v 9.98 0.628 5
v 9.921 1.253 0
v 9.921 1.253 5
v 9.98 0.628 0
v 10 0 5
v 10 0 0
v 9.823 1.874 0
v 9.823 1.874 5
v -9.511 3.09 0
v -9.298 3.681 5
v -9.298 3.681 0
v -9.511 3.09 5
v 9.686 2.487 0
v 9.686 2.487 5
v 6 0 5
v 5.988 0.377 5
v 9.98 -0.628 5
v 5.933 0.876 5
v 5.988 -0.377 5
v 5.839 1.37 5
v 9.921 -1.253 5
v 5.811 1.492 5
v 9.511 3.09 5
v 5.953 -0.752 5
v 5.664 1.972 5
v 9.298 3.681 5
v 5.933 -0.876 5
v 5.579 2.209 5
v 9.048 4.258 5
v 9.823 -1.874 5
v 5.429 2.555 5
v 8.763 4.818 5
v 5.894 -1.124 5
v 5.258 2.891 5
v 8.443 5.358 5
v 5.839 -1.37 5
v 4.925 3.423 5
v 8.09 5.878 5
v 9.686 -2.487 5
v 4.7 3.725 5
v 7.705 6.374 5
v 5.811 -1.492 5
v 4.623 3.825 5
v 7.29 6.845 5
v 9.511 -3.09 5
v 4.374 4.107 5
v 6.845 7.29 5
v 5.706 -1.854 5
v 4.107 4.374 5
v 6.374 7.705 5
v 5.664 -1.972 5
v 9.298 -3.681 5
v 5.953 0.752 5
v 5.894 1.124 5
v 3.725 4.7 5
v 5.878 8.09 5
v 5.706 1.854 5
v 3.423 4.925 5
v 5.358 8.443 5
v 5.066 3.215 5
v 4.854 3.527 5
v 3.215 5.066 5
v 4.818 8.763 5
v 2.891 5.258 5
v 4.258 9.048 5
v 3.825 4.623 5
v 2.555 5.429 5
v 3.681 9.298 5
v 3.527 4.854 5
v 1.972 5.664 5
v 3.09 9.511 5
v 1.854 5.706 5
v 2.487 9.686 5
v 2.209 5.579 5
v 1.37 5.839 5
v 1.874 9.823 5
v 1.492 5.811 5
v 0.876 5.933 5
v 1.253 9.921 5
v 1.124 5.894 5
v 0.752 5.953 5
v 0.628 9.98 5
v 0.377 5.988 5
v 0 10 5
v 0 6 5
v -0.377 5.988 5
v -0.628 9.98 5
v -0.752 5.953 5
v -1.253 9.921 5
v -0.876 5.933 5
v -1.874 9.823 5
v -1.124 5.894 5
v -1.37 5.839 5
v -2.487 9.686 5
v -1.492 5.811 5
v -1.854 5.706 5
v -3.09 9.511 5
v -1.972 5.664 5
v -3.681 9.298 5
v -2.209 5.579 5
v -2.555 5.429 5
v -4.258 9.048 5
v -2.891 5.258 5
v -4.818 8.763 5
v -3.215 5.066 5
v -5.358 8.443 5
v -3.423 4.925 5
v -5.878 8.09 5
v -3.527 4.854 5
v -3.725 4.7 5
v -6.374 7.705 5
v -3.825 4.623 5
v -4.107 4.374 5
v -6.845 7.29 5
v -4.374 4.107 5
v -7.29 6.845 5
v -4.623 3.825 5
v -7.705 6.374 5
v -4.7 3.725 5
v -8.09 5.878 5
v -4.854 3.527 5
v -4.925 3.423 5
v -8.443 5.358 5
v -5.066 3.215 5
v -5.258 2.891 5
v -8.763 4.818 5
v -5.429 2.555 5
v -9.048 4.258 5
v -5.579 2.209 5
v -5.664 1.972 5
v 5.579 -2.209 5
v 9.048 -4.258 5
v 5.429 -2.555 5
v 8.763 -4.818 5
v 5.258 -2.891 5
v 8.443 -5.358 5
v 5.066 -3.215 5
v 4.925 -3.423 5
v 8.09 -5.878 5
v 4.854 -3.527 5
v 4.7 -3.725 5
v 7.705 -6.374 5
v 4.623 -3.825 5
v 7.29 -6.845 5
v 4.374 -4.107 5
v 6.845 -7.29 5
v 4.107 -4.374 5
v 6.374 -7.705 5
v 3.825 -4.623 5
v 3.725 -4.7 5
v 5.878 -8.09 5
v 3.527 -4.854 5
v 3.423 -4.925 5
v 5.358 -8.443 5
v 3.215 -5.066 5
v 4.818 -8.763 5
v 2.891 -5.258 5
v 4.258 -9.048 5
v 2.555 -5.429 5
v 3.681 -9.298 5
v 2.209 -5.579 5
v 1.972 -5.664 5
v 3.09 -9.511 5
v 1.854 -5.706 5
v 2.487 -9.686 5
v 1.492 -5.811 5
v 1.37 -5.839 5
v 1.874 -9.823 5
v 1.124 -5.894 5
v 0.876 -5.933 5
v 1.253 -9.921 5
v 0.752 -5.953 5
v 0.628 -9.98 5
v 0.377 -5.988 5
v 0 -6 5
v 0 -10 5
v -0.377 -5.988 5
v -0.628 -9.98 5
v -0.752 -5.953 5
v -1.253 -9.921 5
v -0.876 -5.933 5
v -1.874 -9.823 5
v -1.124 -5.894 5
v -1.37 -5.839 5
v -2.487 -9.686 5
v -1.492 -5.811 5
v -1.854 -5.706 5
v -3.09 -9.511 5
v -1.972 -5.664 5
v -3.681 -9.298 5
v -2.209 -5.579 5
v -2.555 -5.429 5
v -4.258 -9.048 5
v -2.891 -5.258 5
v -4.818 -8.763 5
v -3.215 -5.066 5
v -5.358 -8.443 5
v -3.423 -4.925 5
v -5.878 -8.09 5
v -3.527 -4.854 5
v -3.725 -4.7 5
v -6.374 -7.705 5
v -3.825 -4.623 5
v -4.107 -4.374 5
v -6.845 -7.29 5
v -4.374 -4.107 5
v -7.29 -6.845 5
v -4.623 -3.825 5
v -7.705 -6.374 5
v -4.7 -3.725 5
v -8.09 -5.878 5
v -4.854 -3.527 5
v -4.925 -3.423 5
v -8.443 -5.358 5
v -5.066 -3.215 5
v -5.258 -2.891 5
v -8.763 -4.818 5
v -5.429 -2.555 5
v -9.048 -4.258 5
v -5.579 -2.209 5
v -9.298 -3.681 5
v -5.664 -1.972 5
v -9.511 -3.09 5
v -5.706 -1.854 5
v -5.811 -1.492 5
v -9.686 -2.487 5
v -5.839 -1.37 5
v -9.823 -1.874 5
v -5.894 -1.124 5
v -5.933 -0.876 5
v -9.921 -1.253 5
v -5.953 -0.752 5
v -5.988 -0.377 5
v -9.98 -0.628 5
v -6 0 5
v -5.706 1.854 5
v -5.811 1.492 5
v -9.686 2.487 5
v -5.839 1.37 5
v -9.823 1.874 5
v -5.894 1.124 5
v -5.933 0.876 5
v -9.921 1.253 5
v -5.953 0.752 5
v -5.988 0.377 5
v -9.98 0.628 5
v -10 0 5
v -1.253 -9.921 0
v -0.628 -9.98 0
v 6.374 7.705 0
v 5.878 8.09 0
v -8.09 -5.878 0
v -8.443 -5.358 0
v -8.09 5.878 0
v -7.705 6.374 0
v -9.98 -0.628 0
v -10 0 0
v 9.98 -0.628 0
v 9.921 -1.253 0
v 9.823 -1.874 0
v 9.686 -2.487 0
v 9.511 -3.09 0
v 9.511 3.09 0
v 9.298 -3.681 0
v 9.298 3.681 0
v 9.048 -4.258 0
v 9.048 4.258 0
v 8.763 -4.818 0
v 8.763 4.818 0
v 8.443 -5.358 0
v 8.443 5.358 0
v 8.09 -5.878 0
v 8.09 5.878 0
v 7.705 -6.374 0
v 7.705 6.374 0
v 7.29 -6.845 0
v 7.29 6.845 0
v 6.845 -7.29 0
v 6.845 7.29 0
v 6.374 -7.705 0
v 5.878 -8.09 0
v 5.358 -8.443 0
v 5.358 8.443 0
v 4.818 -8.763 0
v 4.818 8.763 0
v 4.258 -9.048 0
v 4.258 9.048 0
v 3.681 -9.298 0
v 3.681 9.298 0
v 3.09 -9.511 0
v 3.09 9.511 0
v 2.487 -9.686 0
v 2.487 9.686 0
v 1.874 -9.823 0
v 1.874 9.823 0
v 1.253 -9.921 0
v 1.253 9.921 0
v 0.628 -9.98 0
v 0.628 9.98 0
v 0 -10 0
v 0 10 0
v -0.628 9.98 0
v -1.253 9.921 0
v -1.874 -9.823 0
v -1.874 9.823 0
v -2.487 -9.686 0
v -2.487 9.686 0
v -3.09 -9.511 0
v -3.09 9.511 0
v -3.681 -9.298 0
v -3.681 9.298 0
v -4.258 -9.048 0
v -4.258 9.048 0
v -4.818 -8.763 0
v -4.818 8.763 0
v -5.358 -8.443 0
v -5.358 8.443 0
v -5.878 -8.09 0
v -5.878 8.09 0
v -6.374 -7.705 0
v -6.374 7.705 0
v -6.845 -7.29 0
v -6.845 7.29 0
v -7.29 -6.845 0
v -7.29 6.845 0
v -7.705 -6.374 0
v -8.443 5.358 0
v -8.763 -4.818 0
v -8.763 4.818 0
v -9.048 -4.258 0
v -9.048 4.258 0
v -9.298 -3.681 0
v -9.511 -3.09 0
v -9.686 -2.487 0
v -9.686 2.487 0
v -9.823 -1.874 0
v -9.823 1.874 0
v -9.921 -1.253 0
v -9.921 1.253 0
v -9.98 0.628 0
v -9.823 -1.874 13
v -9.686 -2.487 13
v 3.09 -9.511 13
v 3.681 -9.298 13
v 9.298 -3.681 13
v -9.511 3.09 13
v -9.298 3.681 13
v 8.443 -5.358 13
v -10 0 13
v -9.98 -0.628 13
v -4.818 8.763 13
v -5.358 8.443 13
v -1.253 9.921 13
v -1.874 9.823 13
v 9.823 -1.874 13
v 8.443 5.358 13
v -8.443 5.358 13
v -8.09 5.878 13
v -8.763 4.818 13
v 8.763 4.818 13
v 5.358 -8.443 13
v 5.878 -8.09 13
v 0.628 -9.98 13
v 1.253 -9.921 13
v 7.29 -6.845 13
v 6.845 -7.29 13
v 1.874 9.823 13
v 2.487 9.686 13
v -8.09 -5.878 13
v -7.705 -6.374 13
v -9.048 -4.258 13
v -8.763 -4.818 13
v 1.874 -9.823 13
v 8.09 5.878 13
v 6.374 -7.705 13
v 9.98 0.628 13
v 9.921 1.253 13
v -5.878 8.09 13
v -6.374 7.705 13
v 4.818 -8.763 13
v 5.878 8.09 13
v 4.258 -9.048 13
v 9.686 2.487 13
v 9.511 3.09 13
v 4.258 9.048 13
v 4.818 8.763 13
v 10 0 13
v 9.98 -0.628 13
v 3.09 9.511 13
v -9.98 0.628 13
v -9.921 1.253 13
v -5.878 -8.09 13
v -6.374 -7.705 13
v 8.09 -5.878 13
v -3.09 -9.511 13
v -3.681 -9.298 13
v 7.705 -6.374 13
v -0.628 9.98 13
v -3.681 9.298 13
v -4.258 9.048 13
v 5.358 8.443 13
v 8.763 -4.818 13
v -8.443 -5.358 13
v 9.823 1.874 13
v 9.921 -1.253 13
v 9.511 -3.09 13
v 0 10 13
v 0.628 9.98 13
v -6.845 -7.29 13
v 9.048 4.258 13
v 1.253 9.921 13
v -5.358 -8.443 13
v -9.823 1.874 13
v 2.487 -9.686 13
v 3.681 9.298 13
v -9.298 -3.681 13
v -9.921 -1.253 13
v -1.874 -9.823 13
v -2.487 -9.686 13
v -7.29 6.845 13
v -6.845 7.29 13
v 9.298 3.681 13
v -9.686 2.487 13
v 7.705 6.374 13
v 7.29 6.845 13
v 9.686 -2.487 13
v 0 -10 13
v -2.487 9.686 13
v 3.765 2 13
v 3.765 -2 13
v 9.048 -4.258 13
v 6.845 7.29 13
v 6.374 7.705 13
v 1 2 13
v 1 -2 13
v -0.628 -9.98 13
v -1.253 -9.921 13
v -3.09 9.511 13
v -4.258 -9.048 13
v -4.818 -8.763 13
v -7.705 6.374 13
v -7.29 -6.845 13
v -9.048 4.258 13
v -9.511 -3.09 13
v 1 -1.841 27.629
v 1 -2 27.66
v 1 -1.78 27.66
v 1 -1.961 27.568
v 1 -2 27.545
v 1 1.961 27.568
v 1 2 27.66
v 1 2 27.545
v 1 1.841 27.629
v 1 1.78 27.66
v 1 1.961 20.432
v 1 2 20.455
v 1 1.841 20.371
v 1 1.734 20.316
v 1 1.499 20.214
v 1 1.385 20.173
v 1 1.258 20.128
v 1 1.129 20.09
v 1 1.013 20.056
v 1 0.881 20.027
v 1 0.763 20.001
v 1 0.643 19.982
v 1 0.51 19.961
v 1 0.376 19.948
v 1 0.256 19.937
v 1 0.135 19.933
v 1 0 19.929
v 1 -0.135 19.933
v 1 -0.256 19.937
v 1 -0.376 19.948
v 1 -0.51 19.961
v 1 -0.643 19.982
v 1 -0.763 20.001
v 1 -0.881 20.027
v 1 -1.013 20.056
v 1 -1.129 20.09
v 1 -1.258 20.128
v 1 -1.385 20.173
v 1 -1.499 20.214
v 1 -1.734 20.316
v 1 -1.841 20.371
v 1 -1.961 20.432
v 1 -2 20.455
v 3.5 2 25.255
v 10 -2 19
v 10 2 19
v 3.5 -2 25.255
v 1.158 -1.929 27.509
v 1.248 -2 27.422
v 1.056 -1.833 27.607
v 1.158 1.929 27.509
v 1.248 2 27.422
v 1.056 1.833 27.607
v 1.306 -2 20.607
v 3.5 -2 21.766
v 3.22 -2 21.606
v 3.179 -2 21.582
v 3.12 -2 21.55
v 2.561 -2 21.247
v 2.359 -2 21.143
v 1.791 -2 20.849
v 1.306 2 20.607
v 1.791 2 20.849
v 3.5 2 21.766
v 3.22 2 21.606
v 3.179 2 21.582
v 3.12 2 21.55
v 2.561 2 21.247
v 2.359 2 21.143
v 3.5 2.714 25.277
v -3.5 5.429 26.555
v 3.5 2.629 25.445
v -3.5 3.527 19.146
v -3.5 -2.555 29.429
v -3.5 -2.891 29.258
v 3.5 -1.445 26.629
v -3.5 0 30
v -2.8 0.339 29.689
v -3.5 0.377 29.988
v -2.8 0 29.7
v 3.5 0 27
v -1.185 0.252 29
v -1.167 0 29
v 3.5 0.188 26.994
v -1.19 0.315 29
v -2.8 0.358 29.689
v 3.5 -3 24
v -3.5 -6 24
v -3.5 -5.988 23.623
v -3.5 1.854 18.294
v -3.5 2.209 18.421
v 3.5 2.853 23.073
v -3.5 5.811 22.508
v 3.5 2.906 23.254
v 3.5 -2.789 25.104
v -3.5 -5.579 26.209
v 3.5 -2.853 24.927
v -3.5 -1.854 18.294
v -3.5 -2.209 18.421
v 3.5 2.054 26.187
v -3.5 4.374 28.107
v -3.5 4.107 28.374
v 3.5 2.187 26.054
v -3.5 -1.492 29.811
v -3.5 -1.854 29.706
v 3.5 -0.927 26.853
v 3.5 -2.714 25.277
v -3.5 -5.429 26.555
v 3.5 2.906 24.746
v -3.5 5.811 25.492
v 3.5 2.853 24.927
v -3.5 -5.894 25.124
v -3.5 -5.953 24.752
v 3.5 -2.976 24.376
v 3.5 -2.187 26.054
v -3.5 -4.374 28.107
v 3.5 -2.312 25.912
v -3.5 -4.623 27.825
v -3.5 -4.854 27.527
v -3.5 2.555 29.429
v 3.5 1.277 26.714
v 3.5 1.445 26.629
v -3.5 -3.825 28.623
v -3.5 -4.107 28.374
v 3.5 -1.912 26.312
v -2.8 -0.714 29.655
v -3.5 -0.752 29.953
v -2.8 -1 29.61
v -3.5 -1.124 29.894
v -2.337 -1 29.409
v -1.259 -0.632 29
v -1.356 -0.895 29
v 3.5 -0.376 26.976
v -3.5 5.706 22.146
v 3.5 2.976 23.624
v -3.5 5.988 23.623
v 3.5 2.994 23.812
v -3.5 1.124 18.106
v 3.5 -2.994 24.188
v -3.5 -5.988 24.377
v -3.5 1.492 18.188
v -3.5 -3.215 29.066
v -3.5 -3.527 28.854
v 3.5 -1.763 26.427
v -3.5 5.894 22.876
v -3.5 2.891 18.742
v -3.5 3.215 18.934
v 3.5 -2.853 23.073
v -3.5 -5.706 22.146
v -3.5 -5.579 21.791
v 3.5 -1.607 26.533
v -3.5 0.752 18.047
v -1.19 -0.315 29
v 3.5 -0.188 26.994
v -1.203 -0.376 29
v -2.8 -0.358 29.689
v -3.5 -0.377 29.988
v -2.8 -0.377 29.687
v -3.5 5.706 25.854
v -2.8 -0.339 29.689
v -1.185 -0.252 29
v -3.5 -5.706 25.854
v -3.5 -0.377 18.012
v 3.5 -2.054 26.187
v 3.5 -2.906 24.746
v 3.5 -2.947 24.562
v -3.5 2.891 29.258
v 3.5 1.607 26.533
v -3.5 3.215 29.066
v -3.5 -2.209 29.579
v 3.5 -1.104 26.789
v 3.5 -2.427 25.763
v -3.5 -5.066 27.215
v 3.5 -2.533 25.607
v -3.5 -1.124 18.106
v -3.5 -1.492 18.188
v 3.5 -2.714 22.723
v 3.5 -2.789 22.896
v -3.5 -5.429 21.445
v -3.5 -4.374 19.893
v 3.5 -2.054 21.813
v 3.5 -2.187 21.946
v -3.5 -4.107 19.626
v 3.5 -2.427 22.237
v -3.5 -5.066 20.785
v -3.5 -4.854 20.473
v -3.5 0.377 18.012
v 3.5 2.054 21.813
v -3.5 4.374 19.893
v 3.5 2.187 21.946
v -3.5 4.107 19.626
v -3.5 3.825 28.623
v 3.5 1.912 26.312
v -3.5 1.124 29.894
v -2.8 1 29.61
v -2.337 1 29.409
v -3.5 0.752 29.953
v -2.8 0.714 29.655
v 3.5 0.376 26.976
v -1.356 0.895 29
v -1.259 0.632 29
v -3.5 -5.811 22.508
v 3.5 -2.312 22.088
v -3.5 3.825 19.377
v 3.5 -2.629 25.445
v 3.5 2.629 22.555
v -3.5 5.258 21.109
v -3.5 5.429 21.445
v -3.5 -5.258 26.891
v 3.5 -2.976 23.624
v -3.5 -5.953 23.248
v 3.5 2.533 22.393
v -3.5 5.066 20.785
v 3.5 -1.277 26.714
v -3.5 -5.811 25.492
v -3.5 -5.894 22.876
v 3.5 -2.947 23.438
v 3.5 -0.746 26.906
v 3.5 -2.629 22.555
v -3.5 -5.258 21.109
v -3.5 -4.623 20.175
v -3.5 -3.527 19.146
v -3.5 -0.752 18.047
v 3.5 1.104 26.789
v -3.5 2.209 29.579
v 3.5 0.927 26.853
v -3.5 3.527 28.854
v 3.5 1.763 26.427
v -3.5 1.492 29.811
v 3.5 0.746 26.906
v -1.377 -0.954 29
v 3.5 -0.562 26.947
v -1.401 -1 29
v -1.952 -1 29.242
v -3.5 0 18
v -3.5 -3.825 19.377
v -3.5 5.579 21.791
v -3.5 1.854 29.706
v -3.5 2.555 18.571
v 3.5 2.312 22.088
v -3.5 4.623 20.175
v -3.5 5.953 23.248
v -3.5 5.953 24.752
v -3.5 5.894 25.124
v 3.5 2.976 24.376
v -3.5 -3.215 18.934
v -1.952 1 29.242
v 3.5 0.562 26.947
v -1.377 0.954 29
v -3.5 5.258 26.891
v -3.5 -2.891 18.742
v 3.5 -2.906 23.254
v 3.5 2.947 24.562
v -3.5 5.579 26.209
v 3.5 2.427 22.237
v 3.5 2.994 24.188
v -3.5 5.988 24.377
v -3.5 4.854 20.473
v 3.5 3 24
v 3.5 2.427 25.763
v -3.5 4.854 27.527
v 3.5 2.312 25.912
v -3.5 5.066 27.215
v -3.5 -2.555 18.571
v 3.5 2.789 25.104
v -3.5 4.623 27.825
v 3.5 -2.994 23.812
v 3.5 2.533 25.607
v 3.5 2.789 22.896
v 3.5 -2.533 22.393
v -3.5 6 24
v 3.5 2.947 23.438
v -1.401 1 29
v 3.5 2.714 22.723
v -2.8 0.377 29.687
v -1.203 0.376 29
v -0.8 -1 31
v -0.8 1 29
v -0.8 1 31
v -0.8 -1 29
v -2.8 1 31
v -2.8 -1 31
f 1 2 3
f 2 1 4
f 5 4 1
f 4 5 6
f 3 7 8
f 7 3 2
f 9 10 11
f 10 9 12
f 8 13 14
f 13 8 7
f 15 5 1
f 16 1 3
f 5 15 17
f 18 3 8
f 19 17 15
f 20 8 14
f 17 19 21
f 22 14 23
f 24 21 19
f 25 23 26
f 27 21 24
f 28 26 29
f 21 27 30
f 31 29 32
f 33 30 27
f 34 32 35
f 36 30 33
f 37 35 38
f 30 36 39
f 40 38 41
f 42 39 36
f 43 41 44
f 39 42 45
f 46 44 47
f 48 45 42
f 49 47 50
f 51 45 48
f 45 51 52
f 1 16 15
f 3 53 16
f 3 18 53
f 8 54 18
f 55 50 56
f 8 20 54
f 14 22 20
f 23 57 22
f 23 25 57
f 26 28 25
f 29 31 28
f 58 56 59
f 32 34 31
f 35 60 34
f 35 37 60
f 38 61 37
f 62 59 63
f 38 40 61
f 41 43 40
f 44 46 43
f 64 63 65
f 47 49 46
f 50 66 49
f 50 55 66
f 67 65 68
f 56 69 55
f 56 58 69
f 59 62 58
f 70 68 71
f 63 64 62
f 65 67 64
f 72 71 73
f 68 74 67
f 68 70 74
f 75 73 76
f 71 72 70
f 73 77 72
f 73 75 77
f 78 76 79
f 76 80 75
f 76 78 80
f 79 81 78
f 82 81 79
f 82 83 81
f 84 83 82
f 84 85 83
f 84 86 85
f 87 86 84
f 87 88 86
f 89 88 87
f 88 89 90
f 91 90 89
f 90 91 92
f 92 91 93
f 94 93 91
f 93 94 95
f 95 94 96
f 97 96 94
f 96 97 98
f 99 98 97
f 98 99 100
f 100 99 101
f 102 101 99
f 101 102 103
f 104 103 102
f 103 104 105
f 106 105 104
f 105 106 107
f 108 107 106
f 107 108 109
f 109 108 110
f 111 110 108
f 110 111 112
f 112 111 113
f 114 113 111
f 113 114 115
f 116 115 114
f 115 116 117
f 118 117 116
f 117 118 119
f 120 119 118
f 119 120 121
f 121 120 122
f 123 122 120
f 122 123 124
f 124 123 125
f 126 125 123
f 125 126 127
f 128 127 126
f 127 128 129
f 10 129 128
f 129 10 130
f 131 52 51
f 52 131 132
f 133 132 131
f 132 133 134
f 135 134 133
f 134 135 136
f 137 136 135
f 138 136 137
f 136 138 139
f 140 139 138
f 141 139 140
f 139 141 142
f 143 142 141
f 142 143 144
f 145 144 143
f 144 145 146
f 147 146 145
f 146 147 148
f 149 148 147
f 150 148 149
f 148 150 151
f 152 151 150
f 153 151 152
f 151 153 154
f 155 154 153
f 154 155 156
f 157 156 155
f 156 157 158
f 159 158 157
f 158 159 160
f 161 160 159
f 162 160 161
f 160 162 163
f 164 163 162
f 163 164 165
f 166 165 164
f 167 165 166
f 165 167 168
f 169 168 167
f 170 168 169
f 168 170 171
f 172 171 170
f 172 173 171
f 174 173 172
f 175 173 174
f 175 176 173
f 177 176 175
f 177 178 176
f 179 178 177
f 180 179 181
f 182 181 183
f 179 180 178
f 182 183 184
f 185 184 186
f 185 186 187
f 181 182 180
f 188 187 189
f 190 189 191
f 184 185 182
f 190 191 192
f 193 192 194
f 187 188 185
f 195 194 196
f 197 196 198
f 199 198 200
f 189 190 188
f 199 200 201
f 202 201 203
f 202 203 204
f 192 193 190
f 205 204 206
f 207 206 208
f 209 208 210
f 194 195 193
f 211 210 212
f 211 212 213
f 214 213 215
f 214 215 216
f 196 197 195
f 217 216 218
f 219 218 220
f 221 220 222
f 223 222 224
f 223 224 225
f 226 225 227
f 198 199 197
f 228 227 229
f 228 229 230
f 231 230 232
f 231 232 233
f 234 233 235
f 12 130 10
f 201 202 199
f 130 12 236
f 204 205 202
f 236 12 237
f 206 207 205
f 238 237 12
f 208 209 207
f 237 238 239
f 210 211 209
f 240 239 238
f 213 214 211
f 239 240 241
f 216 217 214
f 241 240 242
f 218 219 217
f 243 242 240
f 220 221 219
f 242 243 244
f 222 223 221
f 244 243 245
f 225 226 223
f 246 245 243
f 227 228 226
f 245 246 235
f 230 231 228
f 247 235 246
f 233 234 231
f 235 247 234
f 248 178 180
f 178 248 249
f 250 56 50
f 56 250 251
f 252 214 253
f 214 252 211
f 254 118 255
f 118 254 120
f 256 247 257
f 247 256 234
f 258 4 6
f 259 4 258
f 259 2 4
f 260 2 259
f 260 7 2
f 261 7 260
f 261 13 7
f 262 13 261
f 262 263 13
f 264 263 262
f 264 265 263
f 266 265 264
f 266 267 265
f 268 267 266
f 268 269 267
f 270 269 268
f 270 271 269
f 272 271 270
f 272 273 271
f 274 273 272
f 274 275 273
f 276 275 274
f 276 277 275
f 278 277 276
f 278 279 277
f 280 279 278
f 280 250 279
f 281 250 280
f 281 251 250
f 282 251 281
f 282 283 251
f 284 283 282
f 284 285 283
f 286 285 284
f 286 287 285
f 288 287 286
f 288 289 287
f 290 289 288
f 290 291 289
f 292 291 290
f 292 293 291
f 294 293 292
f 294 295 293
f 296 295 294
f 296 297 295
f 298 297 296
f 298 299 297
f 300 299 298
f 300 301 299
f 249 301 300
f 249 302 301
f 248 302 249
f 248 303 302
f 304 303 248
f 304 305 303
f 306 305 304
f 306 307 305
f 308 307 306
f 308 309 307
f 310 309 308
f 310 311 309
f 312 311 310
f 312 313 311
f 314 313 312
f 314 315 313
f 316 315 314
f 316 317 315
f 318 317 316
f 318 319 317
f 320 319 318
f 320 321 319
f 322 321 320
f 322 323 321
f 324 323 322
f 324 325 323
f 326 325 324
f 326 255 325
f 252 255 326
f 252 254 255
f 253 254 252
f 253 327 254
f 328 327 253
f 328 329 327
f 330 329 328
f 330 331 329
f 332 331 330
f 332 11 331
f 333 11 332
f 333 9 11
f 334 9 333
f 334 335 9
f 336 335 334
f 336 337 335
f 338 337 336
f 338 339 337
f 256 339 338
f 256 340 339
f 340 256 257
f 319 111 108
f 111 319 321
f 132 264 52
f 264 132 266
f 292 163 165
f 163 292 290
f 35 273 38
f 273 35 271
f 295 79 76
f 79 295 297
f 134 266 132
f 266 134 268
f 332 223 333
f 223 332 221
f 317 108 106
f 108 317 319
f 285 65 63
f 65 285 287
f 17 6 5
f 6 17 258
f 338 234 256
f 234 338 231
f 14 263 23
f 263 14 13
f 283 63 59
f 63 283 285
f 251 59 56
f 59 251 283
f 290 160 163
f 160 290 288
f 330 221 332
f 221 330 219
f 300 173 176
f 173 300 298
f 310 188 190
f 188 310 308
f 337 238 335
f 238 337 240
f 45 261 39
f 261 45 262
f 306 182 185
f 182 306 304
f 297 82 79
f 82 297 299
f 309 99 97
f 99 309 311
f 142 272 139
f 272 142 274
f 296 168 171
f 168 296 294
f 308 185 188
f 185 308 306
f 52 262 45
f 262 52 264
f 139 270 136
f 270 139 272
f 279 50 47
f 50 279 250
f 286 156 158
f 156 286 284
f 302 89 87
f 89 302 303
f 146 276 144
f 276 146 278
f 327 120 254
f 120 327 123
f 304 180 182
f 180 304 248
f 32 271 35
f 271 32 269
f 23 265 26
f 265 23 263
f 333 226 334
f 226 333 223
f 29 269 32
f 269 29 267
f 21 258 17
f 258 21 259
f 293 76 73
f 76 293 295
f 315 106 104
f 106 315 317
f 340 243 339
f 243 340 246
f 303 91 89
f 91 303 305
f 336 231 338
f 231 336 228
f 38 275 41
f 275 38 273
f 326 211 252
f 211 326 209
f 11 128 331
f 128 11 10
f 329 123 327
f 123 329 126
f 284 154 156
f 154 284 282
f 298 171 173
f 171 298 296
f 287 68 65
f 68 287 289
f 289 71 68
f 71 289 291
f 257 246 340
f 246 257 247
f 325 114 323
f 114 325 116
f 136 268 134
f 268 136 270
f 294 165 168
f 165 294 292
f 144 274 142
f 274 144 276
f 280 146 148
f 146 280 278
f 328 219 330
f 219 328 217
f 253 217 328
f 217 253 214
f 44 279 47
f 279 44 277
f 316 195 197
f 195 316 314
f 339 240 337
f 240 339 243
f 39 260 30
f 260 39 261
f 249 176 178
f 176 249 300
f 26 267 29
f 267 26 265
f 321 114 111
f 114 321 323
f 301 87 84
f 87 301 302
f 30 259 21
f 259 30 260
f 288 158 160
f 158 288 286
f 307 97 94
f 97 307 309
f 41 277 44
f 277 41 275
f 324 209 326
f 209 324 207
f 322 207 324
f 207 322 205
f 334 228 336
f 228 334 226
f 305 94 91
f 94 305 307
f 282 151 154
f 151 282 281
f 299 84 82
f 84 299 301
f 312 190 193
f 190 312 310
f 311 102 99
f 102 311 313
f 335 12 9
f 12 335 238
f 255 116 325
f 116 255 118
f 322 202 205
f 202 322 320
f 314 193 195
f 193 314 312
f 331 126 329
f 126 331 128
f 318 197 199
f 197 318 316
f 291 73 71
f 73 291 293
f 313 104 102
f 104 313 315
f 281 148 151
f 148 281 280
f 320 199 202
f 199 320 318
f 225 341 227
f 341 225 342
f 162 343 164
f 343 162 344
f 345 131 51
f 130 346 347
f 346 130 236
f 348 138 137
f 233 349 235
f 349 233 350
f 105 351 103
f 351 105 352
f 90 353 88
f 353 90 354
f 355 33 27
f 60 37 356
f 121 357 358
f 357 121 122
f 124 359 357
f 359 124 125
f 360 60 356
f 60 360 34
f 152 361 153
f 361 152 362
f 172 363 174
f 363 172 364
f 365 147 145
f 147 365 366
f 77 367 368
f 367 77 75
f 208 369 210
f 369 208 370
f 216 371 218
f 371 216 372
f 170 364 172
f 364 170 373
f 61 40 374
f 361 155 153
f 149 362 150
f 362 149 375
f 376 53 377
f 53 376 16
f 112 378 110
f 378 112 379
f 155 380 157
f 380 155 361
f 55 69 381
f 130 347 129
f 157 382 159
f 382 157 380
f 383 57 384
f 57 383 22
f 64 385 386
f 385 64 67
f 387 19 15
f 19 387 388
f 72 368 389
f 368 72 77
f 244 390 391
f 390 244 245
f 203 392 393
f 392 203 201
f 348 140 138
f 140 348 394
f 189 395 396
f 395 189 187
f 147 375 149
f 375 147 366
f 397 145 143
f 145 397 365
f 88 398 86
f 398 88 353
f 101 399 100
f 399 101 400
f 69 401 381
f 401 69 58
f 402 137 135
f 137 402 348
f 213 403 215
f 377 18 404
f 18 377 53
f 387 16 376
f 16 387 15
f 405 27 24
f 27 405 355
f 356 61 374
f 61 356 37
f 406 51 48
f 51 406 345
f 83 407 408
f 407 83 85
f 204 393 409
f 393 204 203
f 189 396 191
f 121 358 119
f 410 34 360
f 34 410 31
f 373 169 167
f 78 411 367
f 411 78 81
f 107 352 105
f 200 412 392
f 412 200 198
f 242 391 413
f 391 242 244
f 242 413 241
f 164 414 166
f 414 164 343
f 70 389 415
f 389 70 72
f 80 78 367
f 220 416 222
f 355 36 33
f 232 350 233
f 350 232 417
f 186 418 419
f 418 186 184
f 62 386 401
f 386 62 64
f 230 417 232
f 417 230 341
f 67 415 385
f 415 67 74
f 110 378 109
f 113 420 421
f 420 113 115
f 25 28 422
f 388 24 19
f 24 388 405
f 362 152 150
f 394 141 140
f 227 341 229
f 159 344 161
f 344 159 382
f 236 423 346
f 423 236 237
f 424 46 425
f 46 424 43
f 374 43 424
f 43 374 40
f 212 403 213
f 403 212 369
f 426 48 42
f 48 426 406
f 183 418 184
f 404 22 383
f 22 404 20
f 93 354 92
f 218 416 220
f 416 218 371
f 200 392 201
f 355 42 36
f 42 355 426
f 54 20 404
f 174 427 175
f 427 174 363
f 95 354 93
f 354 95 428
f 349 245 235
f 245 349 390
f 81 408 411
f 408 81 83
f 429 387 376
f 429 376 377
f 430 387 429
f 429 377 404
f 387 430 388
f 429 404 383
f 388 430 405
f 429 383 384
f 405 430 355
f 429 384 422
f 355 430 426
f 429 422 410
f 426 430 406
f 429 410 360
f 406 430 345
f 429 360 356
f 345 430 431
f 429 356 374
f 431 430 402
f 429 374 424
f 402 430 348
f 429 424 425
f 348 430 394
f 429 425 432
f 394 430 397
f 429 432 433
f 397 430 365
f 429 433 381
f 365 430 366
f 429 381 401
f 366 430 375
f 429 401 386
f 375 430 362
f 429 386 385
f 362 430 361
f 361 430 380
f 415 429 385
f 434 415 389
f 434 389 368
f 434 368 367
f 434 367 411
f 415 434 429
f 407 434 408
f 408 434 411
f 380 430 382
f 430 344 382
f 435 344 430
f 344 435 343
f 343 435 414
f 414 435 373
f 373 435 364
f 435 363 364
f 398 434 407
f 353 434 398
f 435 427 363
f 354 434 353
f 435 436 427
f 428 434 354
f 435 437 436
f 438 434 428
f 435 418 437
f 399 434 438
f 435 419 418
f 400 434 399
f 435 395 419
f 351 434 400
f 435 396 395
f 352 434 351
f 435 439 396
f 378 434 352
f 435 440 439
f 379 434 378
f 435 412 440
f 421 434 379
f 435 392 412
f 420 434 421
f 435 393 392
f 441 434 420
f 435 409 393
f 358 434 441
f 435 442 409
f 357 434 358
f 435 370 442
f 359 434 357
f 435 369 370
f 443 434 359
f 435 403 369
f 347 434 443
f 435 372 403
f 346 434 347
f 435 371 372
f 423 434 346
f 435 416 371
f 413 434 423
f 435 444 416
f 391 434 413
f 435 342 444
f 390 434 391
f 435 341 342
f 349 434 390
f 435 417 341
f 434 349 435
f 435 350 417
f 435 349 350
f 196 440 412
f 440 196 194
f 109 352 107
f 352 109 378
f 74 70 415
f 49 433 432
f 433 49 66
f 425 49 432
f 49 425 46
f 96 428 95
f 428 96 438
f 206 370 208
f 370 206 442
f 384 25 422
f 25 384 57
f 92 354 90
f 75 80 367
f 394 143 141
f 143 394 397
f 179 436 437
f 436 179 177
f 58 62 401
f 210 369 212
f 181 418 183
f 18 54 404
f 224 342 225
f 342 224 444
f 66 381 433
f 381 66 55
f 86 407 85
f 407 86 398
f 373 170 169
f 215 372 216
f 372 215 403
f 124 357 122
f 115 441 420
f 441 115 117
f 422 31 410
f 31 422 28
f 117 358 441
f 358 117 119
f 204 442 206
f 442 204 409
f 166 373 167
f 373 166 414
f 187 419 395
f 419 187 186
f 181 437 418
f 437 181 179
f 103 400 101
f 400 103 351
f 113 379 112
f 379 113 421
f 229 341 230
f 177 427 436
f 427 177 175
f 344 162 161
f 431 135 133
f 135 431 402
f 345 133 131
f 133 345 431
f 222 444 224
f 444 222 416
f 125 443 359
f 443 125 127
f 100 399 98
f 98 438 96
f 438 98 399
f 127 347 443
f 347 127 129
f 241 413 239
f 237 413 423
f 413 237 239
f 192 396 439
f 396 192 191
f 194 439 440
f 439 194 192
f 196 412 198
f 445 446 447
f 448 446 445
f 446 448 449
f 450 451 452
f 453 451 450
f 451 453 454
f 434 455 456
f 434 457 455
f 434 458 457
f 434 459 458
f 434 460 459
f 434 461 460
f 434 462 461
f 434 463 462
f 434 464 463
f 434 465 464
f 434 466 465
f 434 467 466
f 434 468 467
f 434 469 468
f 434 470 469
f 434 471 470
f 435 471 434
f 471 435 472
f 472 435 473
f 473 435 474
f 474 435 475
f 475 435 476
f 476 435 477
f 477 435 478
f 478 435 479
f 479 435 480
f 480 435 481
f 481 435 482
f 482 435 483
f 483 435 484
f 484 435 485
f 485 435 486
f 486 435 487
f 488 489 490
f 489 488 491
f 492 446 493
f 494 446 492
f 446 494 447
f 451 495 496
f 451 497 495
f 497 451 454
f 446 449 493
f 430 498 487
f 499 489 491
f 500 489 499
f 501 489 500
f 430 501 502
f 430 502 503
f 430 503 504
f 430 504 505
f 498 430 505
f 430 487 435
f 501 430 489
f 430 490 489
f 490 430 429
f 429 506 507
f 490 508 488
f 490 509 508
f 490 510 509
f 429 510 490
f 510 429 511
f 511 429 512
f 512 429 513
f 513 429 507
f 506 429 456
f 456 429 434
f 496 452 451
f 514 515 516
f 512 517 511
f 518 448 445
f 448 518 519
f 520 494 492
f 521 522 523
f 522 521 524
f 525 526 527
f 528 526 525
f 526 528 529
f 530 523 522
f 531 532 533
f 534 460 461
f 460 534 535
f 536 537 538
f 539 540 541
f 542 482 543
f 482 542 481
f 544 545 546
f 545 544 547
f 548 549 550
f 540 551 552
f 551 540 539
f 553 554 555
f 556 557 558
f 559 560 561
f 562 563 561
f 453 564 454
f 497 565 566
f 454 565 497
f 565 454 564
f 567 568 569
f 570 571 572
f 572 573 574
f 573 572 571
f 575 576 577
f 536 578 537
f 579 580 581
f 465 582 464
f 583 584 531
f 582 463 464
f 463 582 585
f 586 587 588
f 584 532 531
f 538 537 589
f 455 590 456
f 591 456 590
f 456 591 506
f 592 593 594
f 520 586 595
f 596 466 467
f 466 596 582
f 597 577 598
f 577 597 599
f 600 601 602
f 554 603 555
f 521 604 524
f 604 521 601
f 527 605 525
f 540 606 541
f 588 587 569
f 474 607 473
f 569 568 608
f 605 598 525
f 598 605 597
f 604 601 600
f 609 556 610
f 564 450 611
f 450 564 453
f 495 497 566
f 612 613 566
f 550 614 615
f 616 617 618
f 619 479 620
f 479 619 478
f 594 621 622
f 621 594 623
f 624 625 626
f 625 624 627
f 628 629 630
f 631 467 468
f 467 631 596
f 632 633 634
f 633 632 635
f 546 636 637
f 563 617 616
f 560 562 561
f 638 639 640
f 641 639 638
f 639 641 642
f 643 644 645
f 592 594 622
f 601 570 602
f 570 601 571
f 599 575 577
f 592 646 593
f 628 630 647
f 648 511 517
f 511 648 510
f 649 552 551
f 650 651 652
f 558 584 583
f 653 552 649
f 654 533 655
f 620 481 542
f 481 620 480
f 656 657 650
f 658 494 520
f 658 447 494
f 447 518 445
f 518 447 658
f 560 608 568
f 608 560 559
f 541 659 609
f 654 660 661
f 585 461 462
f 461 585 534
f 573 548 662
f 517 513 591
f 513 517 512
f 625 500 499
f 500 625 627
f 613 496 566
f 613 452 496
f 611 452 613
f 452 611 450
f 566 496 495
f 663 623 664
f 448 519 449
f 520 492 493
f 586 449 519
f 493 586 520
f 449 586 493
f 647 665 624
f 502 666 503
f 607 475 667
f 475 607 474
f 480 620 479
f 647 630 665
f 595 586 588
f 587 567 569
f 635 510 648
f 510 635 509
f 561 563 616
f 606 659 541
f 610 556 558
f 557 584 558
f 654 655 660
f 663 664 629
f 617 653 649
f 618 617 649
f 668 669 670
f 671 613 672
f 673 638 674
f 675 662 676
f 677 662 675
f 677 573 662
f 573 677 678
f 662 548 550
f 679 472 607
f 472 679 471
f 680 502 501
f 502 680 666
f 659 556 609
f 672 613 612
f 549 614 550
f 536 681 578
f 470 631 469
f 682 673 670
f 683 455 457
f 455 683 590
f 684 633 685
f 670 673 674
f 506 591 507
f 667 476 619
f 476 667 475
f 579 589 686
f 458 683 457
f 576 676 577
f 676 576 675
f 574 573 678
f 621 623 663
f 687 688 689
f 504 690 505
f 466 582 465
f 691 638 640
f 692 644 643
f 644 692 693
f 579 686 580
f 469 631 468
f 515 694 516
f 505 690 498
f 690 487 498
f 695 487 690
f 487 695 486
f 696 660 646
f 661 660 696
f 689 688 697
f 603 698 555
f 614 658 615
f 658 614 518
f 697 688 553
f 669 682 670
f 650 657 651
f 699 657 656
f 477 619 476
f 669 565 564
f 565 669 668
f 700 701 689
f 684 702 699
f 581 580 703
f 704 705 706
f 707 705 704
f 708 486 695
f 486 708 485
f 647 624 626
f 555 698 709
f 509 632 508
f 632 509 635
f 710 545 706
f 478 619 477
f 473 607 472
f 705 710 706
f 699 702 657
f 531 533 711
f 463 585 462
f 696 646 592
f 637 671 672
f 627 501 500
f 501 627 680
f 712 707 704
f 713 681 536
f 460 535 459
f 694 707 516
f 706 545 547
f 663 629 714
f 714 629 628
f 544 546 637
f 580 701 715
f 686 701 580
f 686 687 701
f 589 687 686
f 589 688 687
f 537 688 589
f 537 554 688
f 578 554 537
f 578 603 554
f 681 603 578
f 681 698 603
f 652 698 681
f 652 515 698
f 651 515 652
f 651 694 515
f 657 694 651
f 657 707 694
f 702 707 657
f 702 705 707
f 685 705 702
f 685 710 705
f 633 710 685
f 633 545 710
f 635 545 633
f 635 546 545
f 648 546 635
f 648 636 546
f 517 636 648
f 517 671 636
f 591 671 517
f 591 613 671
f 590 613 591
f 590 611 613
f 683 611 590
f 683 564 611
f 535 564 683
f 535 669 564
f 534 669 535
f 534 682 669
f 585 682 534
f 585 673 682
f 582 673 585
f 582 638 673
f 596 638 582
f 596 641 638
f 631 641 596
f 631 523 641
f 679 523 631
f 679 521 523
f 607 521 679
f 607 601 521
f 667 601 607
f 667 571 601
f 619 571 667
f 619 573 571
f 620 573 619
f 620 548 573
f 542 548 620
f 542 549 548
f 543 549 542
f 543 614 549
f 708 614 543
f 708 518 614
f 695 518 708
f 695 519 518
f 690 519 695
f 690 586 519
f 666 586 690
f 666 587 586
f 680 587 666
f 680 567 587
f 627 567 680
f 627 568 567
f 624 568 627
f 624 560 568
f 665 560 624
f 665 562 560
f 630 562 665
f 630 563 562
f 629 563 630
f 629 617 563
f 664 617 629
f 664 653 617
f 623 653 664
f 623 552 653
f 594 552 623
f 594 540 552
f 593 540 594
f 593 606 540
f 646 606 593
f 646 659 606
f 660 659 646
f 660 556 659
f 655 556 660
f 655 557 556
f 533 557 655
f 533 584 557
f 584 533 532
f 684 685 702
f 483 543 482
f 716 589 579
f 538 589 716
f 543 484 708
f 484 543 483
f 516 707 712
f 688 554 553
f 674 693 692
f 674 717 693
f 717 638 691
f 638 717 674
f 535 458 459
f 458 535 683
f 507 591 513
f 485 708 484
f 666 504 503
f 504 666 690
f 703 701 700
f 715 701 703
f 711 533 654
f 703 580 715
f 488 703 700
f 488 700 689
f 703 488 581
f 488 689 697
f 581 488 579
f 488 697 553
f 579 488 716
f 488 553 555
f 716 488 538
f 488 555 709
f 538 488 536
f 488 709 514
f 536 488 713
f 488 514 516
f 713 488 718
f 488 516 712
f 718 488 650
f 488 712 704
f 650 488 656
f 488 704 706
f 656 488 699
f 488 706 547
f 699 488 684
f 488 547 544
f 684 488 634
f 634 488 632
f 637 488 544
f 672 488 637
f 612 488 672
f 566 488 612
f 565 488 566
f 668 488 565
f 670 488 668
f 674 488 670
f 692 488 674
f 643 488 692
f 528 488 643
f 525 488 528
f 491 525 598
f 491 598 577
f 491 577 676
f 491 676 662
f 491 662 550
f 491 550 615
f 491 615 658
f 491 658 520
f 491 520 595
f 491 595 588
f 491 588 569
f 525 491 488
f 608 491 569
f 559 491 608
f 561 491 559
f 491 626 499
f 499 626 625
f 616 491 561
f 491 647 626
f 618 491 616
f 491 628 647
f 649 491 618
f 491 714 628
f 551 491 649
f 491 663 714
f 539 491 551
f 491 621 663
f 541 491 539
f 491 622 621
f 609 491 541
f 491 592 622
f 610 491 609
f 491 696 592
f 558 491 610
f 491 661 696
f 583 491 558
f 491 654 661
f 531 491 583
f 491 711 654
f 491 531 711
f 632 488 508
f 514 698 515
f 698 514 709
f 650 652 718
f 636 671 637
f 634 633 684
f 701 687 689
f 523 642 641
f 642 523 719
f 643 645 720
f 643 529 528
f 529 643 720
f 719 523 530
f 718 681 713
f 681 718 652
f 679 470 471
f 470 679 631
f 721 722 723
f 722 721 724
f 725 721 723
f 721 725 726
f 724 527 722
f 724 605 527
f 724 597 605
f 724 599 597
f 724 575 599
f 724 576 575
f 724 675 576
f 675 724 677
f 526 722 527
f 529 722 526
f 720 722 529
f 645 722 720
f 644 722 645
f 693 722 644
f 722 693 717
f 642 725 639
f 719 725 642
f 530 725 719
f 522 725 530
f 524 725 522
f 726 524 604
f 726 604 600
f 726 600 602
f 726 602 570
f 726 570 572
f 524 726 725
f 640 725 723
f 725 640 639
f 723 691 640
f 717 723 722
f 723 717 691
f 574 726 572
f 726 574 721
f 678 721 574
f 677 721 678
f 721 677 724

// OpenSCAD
$fn = 100;

// основания
cylinder(5, 10, 10);

// начало коня 
translate( [0, 0, 8] )   cylinder(h=10, r1=5, r2=10, center=true);

// треугольная шея
translate( [4, 0, 19] )  scale([0.6, 1, 1]) rotate([90, 0, 0]) cylinder(r1=10, r2=10, h=4,center=true, $fn=3);

// голова
translate( [0, 0, 24] )  rotate( [0, -90, 0] )  cylinder(r1=3, r2=6, h=7, center=true);

// ухо
translate( [-1.8, 0, 30] ) cube(2, center=true);
